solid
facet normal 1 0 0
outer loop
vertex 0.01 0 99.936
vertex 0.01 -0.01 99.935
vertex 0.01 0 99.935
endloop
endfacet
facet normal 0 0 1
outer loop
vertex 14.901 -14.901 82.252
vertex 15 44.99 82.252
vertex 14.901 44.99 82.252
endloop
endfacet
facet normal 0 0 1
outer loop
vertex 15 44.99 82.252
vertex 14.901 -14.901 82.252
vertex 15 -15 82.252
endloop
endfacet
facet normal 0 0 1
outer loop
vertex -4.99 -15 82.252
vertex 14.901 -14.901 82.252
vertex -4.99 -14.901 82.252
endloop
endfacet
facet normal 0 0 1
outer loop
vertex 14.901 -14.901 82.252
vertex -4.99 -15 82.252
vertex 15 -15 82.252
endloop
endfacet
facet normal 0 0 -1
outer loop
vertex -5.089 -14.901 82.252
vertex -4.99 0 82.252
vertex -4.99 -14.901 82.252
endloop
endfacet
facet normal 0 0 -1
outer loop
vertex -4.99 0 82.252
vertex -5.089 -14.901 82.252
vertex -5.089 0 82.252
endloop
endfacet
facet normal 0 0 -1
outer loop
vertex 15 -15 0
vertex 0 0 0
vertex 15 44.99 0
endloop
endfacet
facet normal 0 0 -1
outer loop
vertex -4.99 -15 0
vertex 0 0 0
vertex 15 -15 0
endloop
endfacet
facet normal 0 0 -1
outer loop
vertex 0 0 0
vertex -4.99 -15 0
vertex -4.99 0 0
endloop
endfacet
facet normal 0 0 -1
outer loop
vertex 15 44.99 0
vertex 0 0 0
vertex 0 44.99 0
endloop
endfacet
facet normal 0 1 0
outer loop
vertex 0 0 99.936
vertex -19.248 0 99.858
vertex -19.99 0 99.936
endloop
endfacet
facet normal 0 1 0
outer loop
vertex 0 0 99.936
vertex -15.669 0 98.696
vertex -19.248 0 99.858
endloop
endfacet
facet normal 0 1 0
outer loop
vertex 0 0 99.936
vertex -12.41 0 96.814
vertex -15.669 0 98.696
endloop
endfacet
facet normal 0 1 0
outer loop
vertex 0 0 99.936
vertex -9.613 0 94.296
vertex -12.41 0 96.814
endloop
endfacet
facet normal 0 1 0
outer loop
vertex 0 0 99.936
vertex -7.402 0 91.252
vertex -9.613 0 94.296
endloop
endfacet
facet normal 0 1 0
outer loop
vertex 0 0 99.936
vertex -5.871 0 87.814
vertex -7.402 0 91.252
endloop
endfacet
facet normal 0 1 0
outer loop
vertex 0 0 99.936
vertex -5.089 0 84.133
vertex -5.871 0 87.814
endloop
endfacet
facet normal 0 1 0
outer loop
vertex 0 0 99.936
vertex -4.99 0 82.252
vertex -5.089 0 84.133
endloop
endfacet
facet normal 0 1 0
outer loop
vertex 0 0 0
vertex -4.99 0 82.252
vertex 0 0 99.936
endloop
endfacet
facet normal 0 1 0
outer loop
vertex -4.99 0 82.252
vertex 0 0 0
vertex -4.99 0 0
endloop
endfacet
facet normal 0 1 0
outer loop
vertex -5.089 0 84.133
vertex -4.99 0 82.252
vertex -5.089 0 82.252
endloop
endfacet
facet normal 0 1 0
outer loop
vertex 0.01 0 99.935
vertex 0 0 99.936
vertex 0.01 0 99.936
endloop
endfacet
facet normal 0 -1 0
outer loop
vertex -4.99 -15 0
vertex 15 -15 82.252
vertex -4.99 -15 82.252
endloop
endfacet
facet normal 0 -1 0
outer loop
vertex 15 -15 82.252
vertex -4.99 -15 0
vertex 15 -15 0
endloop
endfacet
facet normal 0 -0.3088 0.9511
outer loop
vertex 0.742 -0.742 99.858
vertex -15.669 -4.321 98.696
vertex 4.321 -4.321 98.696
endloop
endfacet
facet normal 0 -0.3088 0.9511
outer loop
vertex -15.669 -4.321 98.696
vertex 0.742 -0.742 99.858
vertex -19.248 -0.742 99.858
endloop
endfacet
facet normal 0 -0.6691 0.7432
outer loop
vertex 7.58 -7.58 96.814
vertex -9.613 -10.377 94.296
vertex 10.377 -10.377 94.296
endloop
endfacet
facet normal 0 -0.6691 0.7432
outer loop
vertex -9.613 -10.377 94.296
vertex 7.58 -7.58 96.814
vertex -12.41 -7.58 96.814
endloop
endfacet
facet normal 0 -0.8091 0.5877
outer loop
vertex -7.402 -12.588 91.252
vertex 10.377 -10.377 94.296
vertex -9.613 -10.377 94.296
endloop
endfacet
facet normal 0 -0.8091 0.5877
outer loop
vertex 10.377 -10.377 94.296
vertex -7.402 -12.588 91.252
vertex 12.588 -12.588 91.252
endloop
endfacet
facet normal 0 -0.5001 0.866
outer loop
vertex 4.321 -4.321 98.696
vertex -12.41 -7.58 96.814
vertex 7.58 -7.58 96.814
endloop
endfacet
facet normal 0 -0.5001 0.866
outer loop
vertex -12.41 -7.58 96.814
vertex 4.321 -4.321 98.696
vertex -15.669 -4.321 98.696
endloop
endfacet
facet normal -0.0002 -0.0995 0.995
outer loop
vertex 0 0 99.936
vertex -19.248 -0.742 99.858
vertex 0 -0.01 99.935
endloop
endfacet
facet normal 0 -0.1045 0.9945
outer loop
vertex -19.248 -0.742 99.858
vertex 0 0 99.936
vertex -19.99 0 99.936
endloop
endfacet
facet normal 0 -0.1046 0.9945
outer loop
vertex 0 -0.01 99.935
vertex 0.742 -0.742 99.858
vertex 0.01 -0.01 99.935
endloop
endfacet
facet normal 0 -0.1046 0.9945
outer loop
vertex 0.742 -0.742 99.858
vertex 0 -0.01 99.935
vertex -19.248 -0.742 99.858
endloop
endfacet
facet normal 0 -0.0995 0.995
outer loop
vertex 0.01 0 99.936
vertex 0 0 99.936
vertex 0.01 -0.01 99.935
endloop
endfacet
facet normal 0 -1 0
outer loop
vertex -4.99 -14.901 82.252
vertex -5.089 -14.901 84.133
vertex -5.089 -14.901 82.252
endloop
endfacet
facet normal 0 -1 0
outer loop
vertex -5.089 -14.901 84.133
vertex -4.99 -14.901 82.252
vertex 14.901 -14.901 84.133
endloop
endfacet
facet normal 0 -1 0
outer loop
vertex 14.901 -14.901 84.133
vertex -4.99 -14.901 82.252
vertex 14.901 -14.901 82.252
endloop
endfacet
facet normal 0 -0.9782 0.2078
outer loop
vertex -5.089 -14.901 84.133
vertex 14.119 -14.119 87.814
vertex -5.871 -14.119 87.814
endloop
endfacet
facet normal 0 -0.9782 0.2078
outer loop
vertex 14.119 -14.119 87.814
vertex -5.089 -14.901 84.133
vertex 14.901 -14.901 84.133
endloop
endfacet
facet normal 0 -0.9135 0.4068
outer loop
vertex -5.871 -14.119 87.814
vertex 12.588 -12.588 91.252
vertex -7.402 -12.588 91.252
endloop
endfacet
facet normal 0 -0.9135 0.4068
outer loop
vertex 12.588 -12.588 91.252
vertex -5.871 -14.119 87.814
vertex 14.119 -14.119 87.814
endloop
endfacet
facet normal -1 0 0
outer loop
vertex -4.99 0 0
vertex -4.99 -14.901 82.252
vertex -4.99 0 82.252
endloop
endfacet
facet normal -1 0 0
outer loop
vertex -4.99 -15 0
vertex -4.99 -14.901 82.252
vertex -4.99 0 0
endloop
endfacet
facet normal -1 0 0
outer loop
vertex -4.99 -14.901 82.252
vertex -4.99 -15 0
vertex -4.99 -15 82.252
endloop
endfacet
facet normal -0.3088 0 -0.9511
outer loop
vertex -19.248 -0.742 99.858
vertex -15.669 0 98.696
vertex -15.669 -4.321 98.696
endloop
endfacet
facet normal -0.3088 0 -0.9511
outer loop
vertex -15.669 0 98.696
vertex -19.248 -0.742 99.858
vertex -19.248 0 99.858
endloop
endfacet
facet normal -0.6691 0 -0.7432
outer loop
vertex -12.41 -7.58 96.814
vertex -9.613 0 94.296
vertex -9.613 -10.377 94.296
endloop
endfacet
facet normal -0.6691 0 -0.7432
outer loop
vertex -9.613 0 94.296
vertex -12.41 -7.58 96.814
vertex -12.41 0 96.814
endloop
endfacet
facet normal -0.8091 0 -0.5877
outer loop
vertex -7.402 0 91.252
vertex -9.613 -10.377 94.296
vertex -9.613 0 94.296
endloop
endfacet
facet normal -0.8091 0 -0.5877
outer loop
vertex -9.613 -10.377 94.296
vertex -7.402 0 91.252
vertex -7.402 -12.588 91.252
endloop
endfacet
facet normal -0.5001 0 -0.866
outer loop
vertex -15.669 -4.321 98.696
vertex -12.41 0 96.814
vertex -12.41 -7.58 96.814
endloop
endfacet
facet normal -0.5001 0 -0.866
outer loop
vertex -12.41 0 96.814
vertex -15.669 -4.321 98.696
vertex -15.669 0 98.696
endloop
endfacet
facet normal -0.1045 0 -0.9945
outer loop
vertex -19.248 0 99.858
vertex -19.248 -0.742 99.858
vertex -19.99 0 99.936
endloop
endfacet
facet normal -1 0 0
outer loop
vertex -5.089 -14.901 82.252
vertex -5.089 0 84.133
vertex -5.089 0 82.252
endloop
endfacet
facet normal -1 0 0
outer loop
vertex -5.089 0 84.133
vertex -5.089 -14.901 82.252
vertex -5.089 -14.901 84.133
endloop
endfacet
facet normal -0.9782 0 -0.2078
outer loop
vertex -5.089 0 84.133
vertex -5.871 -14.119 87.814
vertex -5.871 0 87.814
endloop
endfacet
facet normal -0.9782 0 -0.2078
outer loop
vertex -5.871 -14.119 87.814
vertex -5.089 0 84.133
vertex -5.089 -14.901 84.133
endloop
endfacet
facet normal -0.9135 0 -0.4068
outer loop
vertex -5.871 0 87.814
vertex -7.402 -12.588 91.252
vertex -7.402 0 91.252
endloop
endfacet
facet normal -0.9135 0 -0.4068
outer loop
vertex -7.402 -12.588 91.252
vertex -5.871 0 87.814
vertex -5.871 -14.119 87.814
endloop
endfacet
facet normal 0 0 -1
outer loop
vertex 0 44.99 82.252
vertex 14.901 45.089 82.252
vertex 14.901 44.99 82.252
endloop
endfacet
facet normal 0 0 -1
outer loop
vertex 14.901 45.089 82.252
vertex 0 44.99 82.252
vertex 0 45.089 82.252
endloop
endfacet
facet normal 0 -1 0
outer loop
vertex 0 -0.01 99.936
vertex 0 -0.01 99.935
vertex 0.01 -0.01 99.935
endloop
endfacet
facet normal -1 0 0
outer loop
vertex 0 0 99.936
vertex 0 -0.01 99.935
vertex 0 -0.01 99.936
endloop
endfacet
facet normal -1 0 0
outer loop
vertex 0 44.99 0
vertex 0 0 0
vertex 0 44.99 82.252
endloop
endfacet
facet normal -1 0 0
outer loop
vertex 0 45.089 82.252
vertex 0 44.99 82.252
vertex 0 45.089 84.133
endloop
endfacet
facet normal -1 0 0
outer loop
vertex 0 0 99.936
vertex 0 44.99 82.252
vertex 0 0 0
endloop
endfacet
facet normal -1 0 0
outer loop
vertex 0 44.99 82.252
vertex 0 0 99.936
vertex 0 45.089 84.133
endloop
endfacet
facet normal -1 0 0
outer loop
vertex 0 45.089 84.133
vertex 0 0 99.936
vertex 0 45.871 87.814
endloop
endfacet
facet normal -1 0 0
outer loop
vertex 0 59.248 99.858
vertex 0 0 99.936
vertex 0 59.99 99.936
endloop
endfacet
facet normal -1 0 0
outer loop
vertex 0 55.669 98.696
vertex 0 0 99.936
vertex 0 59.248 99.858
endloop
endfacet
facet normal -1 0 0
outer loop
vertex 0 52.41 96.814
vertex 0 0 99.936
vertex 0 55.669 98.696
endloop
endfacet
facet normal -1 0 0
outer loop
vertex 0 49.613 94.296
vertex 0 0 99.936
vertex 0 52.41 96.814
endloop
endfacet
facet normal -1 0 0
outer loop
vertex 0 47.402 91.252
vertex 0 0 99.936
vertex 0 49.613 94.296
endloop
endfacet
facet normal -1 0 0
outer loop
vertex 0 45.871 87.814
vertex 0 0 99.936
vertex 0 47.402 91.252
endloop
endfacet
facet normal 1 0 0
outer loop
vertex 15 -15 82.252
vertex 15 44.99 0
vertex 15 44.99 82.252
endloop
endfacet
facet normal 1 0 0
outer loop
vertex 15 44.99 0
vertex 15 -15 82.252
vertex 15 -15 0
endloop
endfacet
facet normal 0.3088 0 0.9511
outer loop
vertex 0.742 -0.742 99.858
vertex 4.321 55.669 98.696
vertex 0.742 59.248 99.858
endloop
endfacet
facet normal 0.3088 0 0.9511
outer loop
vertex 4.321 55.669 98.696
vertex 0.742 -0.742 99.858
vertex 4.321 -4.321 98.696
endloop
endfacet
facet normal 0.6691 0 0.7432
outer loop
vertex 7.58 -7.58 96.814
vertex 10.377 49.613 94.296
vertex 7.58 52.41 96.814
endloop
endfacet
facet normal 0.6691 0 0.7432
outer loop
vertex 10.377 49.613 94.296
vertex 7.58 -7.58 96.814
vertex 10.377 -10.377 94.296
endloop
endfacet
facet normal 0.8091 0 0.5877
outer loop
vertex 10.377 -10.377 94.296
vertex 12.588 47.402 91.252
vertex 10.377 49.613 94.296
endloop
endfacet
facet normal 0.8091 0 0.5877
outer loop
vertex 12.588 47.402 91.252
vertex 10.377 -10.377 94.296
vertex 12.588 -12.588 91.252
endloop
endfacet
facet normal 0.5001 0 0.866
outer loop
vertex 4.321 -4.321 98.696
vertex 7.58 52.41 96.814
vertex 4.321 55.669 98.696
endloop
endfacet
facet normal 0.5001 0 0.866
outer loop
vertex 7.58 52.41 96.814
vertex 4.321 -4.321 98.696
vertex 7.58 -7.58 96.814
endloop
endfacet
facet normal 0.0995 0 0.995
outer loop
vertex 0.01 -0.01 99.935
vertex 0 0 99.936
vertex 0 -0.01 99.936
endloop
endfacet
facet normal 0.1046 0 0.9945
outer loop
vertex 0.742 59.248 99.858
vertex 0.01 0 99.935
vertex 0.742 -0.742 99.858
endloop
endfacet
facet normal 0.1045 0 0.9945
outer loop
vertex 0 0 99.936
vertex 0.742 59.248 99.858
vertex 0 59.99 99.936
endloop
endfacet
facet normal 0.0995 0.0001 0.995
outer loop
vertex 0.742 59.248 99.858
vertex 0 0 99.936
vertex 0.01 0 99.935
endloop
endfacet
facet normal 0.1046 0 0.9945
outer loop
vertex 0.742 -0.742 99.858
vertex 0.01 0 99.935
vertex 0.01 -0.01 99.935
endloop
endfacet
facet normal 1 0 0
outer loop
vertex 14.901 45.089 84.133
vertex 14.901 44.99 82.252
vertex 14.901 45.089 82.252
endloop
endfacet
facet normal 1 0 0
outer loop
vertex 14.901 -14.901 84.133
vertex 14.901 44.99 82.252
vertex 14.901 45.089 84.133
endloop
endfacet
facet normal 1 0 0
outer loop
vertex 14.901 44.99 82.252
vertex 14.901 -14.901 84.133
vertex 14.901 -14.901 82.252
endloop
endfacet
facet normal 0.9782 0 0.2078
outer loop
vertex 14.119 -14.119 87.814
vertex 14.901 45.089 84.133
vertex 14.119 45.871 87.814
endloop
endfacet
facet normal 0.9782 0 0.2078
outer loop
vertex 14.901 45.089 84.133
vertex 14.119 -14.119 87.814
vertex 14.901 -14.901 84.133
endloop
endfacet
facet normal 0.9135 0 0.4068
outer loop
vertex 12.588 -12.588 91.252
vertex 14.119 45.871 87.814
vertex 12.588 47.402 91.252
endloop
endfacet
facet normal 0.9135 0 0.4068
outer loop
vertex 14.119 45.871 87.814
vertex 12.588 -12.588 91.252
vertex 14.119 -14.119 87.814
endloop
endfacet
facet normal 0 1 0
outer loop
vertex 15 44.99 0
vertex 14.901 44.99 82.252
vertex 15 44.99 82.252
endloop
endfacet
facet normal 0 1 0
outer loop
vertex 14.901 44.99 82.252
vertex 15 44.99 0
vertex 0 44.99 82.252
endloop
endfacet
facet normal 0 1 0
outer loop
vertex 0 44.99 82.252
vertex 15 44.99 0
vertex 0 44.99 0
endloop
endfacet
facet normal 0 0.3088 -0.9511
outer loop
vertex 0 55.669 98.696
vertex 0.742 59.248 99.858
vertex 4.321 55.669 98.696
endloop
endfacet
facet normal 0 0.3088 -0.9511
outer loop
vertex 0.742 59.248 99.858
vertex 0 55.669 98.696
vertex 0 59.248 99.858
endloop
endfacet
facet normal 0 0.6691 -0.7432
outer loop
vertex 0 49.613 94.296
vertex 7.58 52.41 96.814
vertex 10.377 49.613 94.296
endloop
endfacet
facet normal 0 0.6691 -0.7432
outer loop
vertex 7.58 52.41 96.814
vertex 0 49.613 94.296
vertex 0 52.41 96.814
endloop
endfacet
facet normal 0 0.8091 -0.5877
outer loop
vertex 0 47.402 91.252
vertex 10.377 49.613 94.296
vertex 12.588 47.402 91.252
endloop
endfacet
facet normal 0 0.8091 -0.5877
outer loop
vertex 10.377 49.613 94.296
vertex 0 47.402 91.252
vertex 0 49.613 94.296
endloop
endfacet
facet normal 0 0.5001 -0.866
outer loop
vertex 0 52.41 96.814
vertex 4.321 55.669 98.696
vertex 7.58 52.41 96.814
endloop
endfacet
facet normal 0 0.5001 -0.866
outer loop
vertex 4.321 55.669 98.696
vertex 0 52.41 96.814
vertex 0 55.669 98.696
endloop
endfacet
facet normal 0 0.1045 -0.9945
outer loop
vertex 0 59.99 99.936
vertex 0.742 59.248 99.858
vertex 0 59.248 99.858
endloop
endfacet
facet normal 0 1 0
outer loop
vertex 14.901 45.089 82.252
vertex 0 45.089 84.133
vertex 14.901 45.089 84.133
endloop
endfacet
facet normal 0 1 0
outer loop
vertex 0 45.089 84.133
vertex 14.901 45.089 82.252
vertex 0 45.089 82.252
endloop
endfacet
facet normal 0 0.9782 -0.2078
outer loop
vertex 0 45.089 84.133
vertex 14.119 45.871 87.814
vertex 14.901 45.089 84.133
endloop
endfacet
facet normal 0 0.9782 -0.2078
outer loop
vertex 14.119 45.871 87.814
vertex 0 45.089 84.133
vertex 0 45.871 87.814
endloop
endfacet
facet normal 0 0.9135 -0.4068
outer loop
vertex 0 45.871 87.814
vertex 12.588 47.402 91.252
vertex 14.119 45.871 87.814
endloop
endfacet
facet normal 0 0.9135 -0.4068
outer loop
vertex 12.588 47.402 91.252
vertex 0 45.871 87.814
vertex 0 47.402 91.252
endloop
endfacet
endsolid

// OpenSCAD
// Delta overlap to avoidf coincident surface
delta = 0.01;

// h = height of skirting
// t = thickness of skirting
// l = overall length of skirting
module skirting(h, t, l)
{
    cylr = 1.2*t;
    cylh = sqrt(2*cylr*t - t*t);
    translate([-l/2,-t,0])
        intersection()
        {
            union ()
            {
                cube(size=[l,t,h-cylh]);
                translate([0,cylr,h-cylh]) rotate([0,90,0]) cylinder(r=cylr, h=l);
            }
            cube(size=[l,t,h]);
        }
}

// h = height of skirting
// t = thickness of skirting
// l = overall length of skirting
// e = end with profile: -1 = left, +1 = right
module skirtingEnd(h, t, l, e)
{
    difference()
    {
        skirting(h, t, l);
        translate([e*l/2,0,0]) rotate([0,0,-90*e]) skirting(h, t, 3*t);
    }
}

//skirtingEnd(100,15,200,1);

// h  = height of skirting
// t  = thickness of skirting
// l1 = length (cornert to wall) of left leg
// l1 = length (cornert to wall) of right leg
module skirtingLShape(h, t, l1, l2)
{
    union()
    {
        // Left leg
        translate([-l1/2+delta,0,0])
        {
            skirtingEnd(h, t, l1, -1);
        }
        // Right leg
        rotate([0,0,90]) translate([l2/2-delta,0,0])
        {
            skirtingEnd(h, t, l2, +1);
        }
        // Corner
        intersection()
        {
            skirting(h, t, l1+l2);
            rotate([0,0,90]) skirting(100, 15, 200);
        }
    }
}

skirtingLShape(100, 15, 20, 60);

//skirtingEnd(100,15,20,-1);
